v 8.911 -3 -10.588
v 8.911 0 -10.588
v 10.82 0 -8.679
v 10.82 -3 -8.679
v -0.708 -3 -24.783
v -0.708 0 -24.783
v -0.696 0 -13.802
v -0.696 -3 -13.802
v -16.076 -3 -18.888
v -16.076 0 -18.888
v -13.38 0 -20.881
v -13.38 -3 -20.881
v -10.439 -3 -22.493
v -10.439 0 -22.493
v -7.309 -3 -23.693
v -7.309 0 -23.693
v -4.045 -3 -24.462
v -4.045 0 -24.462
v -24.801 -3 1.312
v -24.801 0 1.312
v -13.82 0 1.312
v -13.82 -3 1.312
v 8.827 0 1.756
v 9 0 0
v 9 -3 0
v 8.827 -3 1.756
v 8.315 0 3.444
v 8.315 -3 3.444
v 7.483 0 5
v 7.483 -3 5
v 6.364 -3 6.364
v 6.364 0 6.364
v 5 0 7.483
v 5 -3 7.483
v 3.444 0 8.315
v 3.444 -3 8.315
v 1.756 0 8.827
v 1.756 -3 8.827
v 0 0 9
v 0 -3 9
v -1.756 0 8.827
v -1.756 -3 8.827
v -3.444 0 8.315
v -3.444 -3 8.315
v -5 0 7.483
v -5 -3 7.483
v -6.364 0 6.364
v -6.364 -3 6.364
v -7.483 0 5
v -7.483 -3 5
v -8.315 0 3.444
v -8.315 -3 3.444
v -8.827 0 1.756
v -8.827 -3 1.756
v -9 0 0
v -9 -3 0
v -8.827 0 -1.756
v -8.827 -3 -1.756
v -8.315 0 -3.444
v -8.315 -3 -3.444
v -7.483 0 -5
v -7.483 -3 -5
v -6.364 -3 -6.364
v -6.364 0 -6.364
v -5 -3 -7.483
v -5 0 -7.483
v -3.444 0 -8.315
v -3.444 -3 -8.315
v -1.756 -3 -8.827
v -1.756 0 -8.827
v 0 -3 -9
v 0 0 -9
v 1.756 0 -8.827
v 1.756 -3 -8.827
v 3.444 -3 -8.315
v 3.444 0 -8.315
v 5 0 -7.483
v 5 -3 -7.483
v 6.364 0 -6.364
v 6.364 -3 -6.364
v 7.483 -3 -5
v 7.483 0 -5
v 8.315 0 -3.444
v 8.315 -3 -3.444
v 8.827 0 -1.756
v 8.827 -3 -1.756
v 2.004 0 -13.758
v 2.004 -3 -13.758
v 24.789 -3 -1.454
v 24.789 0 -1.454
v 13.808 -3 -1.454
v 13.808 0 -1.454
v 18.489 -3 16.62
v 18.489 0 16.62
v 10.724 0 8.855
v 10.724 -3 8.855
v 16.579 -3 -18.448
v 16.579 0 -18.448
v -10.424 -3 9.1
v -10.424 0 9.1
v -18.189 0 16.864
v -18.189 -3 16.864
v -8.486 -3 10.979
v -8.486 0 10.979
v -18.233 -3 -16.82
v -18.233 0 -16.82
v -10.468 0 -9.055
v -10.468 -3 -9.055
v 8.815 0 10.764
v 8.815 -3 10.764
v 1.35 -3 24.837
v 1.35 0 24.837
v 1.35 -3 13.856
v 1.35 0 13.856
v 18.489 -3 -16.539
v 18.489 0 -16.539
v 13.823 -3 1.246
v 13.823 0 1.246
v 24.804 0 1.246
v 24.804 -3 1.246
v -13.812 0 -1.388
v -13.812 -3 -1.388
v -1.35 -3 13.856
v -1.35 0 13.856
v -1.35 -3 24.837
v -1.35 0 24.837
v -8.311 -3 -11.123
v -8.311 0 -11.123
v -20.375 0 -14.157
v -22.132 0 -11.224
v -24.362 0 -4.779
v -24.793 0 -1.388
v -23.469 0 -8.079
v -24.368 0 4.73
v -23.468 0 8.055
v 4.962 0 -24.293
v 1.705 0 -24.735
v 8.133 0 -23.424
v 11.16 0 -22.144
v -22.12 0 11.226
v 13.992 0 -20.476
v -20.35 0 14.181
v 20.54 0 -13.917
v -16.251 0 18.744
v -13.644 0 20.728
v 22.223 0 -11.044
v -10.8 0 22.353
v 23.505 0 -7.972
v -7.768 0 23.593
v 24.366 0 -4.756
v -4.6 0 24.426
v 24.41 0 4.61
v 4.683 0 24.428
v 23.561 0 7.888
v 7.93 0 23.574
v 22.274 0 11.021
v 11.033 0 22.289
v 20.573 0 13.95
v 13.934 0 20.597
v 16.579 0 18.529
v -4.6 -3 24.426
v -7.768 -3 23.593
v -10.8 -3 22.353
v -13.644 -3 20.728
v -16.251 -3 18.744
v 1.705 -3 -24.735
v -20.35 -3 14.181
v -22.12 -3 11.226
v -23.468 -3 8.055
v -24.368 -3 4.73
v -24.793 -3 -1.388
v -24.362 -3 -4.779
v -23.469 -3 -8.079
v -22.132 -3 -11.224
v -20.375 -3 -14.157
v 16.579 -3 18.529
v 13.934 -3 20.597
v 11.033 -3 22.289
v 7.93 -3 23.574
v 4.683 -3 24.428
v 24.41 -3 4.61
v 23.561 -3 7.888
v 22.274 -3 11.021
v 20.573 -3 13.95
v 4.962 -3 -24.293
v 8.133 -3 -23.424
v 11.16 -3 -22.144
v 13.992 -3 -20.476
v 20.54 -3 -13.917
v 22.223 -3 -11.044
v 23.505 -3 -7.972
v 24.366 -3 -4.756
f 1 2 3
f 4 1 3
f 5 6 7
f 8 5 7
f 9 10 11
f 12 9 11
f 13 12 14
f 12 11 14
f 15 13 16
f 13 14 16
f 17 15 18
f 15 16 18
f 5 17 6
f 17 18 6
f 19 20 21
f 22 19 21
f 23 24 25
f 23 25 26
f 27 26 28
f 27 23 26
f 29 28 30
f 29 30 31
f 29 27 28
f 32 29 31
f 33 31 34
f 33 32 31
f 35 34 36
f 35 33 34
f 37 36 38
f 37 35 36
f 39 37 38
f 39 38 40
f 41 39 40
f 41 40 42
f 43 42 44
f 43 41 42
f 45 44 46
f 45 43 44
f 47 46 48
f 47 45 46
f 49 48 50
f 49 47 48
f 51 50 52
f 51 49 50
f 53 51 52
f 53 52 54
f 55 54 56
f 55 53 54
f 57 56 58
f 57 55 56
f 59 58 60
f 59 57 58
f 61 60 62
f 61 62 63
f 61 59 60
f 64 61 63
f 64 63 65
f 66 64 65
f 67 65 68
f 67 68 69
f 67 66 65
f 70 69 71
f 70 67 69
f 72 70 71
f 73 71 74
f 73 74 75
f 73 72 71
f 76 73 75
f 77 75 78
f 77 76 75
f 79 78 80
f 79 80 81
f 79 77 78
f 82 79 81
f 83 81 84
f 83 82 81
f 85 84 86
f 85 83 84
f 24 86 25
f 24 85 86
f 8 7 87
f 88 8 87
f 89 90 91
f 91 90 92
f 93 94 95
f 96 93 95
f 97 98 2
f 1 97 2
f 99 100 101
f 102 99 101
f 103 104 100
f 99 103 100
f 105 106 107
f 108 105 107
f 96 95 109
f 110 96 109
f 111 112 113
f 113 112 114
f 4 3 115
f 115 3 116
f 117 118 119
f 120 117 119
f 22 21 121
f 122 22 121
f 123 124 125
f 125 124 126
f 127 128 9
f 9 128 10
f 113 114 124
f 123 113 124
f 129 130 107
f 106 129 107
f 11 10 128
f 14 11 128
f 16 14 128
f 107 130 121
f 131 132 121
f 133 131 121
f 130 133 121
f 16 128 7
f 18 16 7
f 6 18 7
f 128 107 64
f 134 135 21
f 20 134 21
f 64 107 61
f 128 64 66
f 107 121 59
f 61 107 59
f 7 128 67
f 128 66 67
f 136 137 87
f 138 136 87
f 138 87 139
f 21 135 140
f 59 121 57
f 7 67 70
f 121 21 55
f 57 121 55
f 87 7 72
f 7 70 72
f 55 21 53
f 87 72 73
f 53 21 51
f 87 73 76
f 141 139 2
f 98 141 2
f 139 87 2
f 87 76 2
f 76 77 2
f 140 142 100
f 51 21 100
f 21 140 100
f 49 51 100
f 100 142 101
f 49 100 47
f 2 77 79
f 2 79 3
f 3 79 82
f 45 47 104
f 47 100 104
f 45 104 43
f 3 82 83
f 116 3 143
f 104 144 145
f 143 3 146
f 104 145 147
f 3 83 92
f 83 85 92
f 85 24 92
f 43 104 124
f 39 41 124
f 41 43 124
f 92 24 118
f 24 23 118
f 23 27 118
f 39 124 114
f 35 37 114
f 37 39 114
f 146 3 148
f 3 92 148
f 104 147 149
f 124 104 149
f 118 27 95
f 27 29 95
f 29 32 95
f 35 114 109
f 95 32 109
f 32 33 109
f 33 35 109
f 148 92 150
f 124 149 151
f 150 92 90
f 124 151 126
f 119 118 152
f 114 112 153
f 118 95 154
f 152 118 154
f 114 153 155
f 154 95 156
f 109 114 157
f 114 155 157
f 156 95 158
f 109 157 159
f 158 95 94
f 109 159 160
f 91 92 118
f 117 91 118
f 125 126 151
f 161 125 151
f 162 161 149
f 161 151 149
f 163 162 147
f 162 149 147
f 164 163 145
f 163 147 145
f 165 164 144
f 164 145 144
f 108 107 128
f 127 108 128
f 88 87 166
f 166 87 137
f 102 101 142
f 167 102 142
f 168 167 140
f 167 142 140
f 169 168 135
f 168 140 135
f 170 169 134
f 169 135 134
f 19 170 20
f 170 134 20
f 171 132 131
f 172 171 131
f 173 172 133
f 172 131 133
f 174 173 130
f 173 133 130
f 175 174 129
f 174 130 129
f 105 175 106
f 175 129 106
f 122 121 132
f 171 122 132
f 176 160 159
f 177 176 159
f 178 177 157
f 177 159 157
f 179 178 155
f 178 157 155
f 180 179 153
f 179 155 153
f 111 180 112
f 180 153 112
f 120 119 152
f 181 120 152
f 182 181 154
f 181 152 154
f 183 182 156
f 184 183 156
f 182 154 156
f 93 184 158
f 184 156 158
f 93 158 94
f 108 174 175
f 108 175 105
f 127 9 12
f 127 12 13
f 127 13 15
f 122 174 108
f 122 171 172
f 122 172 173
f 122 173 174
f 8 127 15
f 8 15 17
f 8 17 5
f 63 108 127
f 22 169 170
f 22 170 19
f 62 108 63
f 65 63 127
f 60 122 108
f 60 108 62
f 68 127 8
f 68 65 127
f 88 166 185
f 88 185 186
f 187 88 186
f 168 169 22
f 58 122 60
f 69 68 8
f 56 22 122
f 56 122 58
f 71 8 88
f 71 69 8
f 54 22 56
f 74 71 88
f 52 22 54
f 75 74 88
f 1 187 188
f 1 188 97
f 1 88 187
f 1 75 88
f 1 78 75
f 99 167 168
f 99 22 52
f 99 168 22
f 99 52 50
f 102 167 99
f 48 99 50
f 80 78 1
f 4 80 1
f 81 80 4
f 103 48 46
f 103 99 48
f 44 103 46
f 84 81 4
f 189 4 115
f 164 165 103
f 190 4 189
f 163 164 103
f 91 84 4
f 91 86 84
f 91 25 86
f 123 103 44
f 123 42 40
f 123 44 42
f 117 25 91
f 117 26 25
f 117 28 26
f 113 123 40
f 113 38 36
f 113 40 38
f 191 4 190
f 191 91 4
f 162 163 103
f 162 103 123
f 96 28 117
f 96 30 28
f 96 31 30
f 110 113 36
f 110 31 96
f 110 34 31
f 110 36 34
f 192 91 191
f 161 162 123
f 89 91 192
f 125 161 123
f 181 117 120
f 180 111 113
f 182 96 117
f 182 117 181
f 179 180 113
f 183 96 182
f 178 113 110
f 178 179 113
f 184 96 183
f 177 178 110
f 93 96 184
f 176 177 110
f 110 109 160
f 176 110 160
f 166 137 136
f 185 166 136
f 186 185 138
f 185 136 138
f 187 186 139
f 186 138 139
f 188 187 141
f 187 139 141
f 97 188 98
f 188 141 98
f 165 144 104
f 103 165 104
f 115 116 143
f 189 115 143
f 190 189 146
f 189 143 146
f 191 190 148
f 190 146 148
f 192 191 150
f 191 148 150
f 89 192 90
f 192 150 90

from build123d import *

# Parameters (mm, degrees)
F0_R     = 9
F1_DEPTH = 3


with BuildPart() as f1:
    # F0 (on Front) → F1 (new body)
    with BuildSketch(Plane.XZ):
        with BuildLine():
            Line((1.35, 24.837218), (1.35, 13.856218))
            Line((1.35, 13.856218), (-1.35, 13.856218))
            Line((-1.35, 13.856218), (-1.35, 24.837218))
            ThreePointArc((-1.35, 24.837218), (-9.30431, 23.022838), (-16.250873, 18.744019))
            Line((-16.250873, 18.744019), (-8.48636, 10.979053))
            Line((-8.48636, 10.979053), (-10.424493, 9.099692))
            Line((-10.424493, 9.099692), (-18.189233, 16.864432))
            ThreePointArc((-18.189233, 16.864432), (-22.849106, 9.663922), (-24.801066, 1.312179))
            Line((-24.801066, 1.312179), (-13.820066, 1.312179))
            Line((-13.820066, 1.312179), (-13.811545, -1.388101))
            Line((-13.811545, -1.388101), (-24.792545, -1.388101))
            ThreePointArc((-24.792545, -1.388101), (-22.854652, -9.674423), (-18.233002, -16.819974))
            Line((-18.233002, -16.819974), (-10.468263, -9.055235))
            Line((-10.468263, -9.055235), (-8.311446, -11.123312))
            Line((-8.311446, -11.123312), (-16.075972, -18.887838))
            ThreePointArc((-16.075972, -18.887838), (-8.894515, -23.145882), (-0.707747, -24.78329))
            Line((-0.707747, -24.78329), (-0.69587, -13.802296))
            Line((-0.69587, -13.802296), (2.003764, -13.757801))
            Line((2.003764, -13.757801), (1.70544, -24.734748))
            ThreePointArc((1.70544, -24.734748), (9.667631, -22.834323), (16.579394, -18.44848))
            Line((16.579394, -18.44848), (8.911142, -10.588437))
            Line((8.911142, -10.588437), (10.82033, -8.679249))
            Line((10.82033, -8.679249), (18.48873, -16.539148))
            ThreePointArc((18.48873, -16.539148), (22.915536, -9.529923), (24.788649, -1.4542))
            Line((24.788649, -1.4542), (13.807649, -1.4542))
            Line((13.807649, -1.4542), (13.823381, 1.245754))
            Line((13.823381, 1.245754), (24.804381, 1.2458))
            ThreePointArc((24.804381, 1.2458), (22.970893, 9.47684), (18.488676, 16.619769))
            Line((18.488676, 16.619769), (10.723937, 8.85503))
            Line((10.723937, 8.85503), (8.814749, 10.764218))
            Line((8.814749, 10.764218), (16.579488, 18.528958))
            ThreePointArc((16.579488, 18.528958), (9.50343, 22.98359), (1.35, 24.837218))
        make_face()
        Circle(F0_R, mode=Mode.SUBTRACT)
    extrude(amount=F1_DEPTH)


solid = f1.part
